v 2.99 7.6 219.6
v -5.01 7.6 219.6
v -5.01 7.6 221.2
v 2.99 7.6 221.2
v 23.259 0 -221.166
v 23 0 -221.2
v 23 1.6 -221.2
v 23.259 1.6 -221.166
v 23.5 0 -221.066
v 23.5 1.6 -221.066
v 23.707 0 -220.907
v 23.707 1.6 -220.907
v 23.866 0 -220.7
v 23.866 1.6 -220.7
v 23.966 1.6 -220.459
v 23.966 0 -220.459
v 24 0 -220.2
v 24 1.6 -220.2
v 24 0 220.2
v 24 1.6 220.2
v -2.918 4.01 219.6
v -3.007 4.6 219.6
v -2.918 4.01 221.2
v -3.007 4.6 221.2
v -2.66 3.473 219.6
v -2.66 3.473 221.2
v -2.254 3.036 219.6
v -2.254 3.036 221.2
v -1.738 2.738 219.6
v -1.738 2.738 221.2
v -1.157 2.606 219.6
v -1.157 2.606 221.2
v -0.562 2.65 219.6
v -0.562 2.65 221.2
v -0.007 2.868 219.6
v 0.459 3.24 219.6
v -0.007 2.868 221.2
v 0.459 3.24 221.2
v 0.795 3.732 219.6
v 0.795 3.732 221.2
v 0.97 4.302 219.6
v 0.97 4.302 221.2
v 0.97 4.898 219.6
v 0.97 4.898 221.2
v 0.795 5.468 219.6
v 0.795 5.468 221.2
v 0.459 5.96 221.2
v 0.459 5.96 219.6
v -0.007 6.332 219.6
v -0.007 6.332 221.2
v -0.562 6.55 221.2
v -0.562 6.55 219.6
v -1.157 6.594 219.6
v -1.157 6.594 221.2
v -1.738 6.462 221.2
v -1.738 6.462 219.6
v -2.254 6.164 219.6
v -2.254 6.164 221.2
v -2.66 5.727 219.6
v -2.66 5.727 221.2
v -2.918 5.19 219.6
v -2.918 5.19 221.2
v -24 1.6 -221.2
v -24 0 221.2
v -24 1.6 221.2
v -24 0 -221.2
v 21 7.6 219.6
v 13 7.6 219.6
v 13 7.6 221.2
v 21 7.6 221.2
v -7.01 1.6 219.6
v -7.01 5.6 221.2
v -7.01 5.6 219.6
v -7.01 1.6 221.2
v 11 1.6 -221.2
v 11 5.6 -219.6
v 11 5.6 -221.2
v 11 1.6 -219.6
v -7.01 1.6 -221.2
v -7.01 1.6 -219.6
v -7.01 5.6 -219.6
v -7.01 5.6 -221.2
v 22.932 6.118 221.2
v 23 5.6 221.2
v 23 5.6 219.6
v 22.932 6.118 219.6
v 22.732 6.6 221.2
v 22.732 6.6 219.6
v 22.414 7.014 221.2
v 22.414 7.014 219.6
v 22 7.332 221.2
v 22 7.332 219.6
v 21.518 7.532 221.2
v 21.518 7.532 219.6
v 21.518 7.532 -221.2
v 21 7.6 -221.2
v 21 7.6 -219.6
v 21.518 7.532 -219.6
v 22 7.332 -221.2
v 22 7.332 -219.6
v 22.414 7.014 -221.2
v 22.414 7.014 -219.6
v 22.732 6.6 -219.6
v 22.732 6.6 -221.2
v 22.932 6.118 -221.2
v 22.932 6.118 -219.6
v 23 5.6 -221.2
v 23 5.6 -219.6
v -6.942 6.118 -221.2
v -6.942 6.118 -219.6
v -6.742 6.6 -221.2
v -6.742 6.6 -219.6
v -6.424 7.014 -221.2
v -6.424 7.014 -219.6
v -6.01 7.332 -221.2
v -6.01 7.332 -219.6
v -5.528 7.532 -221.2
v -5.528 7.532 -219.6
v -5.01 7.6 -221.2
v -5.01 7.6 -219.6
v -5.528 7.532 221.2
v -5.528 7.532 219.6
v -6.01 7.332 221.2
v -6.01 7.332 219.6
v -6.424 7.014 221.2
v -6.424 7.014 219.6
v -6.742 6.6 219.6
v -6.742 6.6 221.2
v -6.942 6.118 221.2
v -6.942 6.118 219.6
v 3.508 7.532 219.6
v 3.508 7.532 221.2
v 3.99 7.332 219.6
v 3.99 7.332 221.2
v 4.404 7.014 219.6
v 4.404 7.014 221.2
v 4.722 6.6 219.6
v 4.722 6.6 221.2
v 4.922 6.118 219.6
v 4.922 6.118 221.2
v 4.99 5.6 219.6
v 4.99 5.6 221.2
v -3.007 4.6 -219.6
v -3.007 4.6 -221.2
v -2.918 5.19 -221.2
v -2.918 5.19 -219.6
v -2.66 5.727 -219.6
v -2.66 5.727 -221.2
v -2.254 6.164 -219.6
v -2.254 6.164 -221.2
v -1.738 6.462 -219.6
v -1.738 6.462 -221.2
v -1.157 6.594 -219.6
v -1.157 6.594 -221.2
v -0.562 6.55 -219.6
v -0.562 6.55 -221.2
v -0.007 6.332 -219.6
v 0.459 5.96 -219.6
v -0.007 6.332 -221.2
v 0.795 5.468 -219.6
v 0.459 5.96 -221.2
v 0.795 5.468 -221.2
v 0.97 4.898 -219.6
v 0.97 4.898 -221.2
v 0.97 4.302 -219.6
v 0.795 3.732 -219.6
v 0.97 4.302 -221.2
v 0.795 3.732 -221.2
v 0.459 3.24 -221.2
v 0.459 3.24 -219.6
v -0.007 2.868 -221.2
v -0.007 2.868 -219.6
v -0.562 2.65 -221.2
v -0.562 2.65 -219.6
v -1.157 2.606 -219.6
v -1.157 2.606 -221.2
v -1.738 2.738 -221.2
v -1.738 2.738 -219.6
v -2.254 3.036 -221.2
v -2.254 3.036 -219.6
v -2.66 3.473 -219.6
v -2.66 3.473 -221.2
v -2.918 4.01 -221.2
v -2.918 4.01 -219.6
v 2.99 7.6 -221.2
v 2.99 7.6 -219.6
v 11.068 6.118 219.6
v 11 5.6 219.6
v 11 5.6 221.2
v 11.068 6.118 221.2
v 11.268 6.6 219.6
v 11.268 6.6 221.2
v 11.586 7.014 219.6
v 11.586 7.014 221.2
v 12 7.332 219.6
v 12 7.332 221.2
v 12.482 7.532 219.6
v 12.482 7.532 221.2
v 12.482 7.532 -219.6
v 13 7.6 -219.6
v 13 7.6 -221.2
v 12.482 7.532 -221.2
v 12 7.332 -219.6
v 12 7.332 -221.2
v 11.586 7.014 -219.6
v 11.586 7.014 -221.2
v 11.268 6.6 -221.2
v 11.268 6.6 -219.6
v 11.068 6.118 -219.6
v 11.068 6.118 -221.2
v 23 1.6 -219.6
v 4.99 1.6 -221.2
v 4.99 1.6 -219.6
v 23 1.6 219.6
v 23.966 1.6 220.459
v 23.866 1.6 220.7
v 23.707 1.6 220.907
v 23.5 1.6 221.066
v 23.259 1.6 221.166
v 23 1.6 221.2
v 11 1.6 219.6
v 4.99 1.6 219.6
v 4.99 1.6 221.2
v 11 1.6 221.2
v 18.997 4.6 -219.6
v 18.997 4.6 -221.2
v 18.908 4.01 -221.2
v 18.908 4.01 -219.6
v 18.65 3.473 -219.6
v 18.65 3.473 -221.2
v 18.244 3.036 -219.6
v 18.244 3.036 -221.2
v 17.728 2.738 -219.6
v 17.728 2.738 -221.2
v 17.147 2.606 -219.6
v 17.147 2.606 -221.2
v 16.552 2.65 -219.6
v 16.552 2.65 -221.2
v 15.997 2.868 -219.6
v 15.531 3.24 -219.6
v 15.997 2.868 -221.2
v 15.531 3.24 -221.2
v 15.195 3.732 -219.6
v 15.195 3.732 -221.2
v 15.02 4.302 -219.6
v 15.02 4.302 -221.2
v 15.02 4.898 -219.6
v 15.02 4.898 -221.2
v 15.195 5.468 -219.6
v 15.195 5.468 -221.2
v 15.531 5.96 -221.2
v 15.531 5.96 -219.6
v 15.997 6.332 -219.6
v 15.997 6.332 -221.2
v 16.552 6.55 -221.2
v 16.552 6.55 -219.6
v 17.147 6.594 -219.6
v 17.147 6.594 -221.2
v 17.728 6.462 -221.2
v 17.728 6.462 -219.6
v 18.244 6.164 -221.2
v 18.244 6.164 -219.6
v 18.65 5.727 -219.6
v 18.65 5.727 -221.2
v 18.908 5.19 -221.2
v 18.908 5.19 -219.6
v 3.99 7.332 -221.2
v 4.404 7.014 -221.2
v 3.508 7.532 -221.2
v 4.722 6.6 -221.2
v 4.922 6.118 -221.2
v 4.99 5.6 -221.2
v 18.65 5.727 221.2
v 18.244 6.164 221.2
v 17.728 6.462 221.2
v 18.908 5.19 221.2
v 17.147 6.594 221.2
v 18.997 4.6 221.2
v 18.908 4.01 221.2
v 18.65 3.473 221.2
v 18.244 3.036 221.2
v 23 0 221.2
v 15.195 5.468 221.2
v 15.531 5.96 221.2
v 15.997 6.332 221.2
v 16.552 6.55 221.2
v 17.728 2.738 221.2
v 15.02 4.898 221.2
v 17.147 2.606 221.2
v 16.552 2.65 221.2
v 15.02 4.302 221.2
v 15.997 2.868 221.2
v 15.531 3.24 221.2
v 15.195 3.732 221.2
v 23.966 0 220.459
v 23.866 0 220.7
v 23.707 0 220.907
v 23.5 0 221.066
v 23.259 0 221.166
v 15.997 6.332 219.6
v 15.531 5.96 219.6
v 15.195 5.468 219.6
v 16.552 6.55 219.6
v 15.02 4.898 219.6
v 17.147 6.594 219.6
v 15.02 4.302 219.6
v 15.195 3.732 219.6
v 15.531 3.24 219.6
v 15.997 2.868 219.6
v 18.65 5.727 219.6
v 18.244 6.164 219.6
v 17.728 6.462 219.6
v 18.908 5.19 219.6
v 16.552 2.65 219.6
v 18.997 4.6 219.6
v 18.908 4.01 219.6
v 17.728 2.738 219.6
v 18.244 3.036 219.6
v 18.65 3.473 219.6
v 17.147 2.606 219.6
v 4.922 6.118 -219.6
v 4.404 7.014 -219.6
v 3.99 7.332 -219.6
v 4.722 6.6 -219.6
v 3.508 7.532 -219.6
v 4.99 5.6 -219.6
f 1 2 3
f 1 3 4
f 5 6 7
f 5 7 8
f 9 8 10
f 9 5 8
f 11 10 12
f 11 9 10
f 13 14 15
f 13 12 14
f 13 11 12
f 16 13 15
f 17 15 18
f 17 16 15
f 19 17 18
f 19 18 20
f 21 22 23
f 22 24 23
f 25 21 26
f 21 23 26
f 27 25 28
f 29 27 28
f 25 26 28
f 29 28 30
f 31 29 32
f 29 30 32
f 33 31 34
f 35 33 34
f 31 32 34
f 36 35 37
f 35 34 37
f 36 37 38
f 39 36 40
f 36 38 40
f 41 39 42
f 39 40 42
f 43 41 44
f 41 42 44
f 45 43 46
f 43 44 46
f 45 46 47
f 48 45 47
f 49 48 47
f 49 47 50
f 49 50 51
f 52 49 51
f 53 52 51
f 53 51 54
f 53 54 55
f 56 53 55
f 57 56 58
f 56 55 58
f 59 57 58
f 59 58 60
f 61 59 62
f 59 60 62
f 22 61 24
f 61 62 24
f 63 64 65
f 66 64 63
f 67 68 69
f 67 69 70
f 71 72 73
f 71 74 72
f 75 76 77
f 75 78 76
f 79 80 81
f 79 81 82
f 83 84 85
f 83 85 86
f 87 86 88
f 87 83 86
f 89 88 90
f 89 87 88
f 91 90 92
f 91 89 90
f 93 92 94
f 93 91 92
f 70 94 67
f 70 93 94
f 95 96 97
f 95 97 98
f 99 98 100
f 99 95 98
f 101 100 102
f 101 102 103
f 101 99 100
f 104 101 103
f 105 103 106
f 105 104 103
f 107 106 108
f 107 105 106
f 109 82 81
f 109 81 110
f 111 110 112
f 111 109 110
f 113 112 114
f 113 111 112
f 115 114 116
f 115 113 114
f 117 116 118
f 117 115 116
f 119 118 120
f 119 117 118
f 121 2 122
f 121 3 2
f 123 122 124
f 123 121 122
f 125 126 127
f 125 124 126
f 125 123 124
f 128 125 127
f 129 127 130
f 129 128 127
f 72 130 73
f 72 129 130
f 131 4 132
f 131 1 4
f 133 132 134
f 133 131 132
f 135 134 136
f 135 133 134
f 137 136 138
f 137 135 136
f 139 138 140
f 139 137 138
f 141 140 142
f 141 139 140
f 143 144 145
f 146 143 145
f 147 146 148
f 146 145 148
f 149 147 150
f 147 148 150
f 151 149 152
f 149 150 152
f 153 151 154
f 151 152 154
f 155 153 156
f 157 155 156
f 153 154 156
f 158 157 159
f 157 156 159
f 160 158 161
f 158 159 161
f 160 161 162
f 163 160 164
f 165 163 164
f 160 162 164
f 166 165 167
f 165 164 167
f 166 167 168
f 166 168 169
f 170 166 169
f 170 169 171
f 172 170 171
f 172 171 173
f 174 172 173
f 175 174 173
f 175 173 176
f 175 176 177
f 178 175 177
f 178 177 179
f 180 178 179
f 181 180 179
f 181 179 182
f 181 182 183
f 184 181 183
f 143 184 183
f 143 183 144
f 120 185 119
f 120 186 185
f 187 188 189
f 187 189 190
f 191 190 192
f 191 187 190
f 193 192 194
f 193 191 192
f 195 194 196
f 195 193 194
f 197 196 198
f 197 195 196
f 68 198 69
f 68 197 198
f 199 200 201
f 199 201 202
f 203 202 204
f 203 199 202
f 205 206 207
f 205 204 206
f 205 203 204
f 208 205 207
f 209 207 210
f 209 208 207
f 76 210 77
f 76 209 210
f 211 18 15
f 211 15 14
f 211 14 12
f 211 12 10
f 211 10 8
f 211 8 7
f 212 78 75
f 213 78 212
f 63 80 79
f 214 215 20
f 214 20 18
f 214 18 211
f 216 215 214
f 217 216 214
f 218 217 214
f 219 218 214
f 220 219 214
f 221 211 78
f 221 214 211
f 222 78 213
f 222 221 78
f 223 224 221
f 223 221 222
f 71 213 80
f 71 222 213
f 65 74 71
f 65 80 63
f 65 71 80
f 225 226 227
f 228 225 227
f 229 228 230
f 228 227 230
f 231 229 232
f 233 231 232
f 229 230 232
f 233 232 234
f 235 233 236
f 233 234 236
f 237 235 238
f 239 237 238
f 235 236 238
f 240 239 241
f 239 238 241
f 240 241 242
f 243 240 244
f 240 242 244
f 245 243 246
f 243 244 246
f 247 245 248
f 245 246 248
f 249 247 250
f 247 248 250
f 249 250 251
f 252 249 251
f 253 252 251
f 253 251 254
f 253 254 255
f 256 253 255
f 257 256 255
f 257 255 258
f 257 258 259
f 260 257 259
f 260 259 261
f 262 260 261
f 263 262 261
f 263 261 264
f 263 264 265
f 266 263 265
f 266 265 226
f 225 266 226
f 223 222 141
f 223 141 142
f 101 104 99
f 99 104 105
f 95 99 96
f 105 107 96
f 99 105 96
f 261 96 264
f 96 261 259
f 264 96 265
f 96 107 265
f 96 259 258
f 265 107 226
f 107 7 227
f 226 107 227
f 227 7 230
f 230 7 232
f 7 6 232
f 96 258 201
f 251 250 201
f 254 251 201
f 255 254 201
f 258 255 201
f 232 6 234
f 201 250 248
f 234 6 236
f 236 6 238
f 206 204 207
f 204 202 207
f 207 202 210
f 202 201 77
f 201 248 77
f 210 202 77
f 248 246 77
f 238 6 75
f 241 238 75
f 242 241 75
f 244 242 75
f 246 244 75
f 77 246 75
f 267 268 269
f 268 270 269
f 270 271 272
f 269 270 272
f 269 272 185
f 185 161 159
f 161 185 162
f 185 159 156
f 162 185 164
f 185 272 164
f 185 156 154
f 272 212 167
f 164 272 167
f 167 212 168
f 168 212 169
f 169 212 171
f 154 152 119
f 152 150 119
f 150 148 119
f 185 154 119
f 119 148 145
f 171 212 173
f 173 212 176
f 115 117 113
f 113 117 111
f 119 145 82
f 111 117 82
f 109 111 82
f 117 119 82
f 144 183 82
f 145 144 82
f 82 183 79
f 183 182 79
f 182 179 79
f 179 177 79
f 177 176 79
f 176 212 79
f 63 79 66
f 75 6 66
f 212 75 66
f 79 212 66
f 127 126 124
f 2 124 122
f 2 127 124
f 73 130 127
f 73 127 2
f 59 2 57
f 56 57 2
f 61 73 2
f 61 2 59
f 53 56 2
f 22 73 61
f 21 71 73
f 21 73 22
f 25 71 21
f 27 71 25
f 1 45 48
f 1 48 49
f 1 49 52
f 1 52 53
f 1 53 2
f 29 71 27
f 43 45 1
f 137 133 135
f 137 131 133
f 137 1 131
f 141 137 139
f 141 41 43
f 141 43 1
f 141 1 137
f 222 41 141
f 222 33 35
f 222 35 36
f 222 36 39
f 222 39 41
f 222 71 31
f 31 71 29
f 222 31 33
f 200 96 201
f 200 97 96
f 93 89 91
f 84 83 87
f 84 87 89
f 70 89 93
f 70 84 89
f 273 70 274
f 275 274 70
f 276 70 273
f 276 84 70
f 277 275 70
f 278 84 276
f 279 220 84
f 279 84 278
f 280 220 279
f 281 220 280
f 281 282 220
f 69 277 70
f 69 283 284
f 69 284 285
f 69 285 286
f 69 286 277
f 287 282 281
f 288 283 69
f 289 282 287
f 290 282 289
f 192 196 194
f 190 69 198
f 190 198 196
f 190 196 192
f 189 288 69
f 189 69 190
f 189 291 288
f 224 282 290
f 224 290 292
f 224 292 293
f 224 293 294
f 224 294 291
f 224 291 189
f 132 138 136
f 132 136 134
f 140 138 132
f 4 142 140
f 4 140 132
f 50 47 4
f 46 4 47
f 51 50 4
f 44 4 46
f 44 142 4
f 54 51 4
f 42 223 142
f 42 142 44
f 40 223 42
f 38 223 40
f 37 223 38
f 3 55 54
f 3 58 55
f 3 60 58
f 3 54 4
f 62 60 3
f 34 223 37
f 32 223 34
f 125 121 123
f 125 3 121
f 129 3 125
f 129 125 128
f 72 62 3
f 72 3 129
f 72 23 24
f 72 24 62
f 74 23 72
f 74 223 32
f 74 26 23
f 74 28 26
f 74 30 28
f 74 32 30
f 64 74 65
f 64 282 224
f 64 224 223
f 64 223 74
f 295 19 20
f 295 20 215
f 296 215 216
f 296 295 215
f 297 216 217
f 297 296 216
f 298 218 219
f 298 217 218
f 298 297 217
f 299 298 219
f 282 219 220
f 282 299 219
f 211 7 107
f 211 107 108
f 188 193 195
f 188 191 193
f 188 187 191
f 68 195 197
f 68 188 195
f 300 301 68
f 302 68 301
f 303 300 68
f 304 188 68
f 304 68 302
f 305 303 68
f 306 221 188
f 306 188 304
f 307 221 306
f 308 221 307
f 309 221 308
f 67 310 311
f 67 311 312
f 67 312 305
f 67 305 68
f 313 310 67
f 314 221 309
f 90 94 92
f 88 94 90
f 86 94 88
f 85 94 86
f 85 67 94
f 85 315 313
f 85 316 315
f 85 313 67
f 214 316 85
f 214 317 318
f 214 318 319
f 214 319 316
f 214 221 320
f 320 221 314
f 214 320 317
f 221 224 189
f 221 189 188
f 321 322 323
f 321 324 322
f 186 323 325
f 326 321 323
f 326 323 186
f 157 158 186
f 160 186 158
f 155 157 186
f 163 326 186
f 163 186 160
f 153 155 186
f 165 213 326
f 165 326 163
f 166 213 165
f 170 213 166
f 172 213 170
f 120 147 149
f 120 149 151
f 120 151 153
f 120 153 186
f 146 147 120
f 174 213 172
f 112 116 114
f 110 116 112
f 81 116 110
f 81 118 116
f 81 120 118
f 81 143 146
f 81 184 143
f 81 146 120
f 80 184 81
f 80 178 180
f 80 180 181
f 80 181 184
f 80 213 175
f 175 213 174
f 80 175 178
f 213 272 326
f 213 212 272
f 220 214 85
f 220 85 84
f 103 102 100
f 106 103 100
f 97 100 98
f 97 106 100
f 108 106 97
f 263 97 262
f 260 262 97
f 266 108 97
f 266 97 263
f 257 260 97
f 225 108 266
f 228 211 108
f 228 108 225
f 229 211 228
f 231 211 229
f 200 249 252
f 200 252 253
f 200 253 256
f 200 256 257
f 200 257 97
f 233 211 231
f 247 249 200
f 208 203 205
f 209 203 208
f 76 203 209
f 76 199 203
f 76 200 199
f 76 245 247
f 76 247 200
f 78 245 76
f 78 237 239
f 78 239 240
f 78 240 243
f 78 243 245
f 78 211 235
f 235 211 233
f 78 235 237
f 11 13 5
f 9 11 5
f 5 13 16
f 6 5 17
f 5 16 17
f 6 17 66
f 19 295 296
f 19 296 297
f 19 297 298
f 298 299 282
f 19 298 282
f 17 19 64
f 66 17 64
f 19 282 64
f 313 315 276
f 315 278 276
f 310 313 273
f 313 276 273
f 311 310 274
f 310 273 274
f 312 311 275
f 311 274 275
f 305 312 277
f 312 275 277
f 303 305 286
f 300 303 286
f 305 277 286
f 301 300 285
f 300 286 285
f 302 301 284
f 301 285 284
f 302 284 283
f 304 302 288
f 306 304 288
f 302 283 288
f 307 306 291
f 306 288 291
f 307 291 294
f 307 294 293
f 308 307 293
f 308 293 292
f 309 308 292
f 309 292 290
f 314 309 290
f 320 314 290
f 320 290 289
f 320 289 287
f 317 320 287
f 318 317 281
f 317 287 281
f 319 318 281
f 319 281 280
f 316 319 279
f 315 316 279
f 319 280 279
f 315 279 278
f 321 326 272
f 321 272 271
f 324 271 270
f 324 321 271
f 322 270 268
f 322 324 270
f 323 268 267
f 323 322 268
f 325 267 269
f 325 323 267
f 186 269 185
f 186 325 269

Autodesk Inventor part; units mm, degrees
ref_plane "XZ Plane" through (0, 0, 0) normal (0, 1, 0) x (-1, 0, 0)
ref_plane "XY Plane" through (0, 0, 0) normal (0, 0, 1) x (1, 0, 0)
sketch "Sketch1" plane through (0, 0, 0) normal (0, 1, 0) x (-1, 0, 0)
  line L0 (24, 221.2) -> (24, -221.2)
  line L1 (-24, -220.2) -> (-24, 220.2)
  arc A0 (-23, 221.2) -> (-24, 220.2) centre (-23, 220.2) ccw
  arc A1 (-24, -220.2) -> (-23, -221.2) centre (-23, -220.2) ccw
  line L2 (0, 0) -> (-12.5, 0)
  line L3 (-23, 221.2) -> (24, 221.2)
  line L4 (-23, -221.2) -> (24, -221.2)
  point P0 (-24, -221.2)
  dimension "d0" = 442.4
  dimension "d1" = 48
  dimension "d2" = 1
  dimension "d3" = 1
  dimension "d58" = 221.2
extrude "Extrusion1" add sketch "Sketch1" along normal blind 1.6
ref_plane "Work Plane1" through (7.995, 0, 0) normal (1, 0, 0) x (0, 1, 0)
sketch "Sketch4" plane through (0, 1.6, 0) normal (0, 1, 0) x (1, 0, 0)
  line L0 (-24, -221.2) -> (23, -221.2) projected
  line L1 (23, -221.2) -> (15, -221.2)
  line L2 (11, -219.6) -> (23, -219.6)
  line L3 (23, -219.6) -> (23, -221.2)
  line L4 (23, -221.2) -> (11, -221.2)
  line L5 (11, -221.2) -> (11, -219.6)
  line L6 (23, -221.2) -> (22, -221.2)
  line L7 (24, -220.2) -> (24, 220.2) projected
  point P0 (0, 0)
  dimension "d46" = 8
  dimension "d48" = 12
  dimension "d57" = 1
extrude "Extrusion4" add sketch "Sketch4" along normal blind 6
sketch "Sketch5" plane through (-24, 0, 221.2) normal (0, 0, 1) x (1, 0, 0)
  line L0 (35, 1.6) -> (47, 1.6) projected
  line L1 (47, 1.6) -> (47, 7.6) projected
  line L2 (47, 7.6) -> (35, 7.6) projected
  line L3 (0, 1.6) -> (35, 1.6) projected
  circle A0 centre (40.9972, 4.6) radius 2
  line L4 (35, 1.6) -> (47, 7.6)
  line L5 (35, 7.6) -> (47, 1.6)
  point P0 (24, 0)
  dimension "d52" = 4
extrude "Extrusion5" cut sketch "Sketch5" against normal blind 6 contours L4 L5 A0 | A0 L5 L4 | L5 L4 A0 | A0 L4 L5
fillet "Fillet3" radius 2 2 edges at (23, 7.6, 220.4) (11, 7.6, 220.4)
mirror "Mirror5" about plane through (7.995, 0, 0) normal (1, 0, 0) of "Extrusion4", "Extrusion5", "Fillet3"
mirror "Mirror6" about plane through (0, 0, 0) normal (0, 0, 1) of "Extrusion4", "Extrusion5", "Fillet3", "Mirror5"
properties part number "Caja - Pared"
